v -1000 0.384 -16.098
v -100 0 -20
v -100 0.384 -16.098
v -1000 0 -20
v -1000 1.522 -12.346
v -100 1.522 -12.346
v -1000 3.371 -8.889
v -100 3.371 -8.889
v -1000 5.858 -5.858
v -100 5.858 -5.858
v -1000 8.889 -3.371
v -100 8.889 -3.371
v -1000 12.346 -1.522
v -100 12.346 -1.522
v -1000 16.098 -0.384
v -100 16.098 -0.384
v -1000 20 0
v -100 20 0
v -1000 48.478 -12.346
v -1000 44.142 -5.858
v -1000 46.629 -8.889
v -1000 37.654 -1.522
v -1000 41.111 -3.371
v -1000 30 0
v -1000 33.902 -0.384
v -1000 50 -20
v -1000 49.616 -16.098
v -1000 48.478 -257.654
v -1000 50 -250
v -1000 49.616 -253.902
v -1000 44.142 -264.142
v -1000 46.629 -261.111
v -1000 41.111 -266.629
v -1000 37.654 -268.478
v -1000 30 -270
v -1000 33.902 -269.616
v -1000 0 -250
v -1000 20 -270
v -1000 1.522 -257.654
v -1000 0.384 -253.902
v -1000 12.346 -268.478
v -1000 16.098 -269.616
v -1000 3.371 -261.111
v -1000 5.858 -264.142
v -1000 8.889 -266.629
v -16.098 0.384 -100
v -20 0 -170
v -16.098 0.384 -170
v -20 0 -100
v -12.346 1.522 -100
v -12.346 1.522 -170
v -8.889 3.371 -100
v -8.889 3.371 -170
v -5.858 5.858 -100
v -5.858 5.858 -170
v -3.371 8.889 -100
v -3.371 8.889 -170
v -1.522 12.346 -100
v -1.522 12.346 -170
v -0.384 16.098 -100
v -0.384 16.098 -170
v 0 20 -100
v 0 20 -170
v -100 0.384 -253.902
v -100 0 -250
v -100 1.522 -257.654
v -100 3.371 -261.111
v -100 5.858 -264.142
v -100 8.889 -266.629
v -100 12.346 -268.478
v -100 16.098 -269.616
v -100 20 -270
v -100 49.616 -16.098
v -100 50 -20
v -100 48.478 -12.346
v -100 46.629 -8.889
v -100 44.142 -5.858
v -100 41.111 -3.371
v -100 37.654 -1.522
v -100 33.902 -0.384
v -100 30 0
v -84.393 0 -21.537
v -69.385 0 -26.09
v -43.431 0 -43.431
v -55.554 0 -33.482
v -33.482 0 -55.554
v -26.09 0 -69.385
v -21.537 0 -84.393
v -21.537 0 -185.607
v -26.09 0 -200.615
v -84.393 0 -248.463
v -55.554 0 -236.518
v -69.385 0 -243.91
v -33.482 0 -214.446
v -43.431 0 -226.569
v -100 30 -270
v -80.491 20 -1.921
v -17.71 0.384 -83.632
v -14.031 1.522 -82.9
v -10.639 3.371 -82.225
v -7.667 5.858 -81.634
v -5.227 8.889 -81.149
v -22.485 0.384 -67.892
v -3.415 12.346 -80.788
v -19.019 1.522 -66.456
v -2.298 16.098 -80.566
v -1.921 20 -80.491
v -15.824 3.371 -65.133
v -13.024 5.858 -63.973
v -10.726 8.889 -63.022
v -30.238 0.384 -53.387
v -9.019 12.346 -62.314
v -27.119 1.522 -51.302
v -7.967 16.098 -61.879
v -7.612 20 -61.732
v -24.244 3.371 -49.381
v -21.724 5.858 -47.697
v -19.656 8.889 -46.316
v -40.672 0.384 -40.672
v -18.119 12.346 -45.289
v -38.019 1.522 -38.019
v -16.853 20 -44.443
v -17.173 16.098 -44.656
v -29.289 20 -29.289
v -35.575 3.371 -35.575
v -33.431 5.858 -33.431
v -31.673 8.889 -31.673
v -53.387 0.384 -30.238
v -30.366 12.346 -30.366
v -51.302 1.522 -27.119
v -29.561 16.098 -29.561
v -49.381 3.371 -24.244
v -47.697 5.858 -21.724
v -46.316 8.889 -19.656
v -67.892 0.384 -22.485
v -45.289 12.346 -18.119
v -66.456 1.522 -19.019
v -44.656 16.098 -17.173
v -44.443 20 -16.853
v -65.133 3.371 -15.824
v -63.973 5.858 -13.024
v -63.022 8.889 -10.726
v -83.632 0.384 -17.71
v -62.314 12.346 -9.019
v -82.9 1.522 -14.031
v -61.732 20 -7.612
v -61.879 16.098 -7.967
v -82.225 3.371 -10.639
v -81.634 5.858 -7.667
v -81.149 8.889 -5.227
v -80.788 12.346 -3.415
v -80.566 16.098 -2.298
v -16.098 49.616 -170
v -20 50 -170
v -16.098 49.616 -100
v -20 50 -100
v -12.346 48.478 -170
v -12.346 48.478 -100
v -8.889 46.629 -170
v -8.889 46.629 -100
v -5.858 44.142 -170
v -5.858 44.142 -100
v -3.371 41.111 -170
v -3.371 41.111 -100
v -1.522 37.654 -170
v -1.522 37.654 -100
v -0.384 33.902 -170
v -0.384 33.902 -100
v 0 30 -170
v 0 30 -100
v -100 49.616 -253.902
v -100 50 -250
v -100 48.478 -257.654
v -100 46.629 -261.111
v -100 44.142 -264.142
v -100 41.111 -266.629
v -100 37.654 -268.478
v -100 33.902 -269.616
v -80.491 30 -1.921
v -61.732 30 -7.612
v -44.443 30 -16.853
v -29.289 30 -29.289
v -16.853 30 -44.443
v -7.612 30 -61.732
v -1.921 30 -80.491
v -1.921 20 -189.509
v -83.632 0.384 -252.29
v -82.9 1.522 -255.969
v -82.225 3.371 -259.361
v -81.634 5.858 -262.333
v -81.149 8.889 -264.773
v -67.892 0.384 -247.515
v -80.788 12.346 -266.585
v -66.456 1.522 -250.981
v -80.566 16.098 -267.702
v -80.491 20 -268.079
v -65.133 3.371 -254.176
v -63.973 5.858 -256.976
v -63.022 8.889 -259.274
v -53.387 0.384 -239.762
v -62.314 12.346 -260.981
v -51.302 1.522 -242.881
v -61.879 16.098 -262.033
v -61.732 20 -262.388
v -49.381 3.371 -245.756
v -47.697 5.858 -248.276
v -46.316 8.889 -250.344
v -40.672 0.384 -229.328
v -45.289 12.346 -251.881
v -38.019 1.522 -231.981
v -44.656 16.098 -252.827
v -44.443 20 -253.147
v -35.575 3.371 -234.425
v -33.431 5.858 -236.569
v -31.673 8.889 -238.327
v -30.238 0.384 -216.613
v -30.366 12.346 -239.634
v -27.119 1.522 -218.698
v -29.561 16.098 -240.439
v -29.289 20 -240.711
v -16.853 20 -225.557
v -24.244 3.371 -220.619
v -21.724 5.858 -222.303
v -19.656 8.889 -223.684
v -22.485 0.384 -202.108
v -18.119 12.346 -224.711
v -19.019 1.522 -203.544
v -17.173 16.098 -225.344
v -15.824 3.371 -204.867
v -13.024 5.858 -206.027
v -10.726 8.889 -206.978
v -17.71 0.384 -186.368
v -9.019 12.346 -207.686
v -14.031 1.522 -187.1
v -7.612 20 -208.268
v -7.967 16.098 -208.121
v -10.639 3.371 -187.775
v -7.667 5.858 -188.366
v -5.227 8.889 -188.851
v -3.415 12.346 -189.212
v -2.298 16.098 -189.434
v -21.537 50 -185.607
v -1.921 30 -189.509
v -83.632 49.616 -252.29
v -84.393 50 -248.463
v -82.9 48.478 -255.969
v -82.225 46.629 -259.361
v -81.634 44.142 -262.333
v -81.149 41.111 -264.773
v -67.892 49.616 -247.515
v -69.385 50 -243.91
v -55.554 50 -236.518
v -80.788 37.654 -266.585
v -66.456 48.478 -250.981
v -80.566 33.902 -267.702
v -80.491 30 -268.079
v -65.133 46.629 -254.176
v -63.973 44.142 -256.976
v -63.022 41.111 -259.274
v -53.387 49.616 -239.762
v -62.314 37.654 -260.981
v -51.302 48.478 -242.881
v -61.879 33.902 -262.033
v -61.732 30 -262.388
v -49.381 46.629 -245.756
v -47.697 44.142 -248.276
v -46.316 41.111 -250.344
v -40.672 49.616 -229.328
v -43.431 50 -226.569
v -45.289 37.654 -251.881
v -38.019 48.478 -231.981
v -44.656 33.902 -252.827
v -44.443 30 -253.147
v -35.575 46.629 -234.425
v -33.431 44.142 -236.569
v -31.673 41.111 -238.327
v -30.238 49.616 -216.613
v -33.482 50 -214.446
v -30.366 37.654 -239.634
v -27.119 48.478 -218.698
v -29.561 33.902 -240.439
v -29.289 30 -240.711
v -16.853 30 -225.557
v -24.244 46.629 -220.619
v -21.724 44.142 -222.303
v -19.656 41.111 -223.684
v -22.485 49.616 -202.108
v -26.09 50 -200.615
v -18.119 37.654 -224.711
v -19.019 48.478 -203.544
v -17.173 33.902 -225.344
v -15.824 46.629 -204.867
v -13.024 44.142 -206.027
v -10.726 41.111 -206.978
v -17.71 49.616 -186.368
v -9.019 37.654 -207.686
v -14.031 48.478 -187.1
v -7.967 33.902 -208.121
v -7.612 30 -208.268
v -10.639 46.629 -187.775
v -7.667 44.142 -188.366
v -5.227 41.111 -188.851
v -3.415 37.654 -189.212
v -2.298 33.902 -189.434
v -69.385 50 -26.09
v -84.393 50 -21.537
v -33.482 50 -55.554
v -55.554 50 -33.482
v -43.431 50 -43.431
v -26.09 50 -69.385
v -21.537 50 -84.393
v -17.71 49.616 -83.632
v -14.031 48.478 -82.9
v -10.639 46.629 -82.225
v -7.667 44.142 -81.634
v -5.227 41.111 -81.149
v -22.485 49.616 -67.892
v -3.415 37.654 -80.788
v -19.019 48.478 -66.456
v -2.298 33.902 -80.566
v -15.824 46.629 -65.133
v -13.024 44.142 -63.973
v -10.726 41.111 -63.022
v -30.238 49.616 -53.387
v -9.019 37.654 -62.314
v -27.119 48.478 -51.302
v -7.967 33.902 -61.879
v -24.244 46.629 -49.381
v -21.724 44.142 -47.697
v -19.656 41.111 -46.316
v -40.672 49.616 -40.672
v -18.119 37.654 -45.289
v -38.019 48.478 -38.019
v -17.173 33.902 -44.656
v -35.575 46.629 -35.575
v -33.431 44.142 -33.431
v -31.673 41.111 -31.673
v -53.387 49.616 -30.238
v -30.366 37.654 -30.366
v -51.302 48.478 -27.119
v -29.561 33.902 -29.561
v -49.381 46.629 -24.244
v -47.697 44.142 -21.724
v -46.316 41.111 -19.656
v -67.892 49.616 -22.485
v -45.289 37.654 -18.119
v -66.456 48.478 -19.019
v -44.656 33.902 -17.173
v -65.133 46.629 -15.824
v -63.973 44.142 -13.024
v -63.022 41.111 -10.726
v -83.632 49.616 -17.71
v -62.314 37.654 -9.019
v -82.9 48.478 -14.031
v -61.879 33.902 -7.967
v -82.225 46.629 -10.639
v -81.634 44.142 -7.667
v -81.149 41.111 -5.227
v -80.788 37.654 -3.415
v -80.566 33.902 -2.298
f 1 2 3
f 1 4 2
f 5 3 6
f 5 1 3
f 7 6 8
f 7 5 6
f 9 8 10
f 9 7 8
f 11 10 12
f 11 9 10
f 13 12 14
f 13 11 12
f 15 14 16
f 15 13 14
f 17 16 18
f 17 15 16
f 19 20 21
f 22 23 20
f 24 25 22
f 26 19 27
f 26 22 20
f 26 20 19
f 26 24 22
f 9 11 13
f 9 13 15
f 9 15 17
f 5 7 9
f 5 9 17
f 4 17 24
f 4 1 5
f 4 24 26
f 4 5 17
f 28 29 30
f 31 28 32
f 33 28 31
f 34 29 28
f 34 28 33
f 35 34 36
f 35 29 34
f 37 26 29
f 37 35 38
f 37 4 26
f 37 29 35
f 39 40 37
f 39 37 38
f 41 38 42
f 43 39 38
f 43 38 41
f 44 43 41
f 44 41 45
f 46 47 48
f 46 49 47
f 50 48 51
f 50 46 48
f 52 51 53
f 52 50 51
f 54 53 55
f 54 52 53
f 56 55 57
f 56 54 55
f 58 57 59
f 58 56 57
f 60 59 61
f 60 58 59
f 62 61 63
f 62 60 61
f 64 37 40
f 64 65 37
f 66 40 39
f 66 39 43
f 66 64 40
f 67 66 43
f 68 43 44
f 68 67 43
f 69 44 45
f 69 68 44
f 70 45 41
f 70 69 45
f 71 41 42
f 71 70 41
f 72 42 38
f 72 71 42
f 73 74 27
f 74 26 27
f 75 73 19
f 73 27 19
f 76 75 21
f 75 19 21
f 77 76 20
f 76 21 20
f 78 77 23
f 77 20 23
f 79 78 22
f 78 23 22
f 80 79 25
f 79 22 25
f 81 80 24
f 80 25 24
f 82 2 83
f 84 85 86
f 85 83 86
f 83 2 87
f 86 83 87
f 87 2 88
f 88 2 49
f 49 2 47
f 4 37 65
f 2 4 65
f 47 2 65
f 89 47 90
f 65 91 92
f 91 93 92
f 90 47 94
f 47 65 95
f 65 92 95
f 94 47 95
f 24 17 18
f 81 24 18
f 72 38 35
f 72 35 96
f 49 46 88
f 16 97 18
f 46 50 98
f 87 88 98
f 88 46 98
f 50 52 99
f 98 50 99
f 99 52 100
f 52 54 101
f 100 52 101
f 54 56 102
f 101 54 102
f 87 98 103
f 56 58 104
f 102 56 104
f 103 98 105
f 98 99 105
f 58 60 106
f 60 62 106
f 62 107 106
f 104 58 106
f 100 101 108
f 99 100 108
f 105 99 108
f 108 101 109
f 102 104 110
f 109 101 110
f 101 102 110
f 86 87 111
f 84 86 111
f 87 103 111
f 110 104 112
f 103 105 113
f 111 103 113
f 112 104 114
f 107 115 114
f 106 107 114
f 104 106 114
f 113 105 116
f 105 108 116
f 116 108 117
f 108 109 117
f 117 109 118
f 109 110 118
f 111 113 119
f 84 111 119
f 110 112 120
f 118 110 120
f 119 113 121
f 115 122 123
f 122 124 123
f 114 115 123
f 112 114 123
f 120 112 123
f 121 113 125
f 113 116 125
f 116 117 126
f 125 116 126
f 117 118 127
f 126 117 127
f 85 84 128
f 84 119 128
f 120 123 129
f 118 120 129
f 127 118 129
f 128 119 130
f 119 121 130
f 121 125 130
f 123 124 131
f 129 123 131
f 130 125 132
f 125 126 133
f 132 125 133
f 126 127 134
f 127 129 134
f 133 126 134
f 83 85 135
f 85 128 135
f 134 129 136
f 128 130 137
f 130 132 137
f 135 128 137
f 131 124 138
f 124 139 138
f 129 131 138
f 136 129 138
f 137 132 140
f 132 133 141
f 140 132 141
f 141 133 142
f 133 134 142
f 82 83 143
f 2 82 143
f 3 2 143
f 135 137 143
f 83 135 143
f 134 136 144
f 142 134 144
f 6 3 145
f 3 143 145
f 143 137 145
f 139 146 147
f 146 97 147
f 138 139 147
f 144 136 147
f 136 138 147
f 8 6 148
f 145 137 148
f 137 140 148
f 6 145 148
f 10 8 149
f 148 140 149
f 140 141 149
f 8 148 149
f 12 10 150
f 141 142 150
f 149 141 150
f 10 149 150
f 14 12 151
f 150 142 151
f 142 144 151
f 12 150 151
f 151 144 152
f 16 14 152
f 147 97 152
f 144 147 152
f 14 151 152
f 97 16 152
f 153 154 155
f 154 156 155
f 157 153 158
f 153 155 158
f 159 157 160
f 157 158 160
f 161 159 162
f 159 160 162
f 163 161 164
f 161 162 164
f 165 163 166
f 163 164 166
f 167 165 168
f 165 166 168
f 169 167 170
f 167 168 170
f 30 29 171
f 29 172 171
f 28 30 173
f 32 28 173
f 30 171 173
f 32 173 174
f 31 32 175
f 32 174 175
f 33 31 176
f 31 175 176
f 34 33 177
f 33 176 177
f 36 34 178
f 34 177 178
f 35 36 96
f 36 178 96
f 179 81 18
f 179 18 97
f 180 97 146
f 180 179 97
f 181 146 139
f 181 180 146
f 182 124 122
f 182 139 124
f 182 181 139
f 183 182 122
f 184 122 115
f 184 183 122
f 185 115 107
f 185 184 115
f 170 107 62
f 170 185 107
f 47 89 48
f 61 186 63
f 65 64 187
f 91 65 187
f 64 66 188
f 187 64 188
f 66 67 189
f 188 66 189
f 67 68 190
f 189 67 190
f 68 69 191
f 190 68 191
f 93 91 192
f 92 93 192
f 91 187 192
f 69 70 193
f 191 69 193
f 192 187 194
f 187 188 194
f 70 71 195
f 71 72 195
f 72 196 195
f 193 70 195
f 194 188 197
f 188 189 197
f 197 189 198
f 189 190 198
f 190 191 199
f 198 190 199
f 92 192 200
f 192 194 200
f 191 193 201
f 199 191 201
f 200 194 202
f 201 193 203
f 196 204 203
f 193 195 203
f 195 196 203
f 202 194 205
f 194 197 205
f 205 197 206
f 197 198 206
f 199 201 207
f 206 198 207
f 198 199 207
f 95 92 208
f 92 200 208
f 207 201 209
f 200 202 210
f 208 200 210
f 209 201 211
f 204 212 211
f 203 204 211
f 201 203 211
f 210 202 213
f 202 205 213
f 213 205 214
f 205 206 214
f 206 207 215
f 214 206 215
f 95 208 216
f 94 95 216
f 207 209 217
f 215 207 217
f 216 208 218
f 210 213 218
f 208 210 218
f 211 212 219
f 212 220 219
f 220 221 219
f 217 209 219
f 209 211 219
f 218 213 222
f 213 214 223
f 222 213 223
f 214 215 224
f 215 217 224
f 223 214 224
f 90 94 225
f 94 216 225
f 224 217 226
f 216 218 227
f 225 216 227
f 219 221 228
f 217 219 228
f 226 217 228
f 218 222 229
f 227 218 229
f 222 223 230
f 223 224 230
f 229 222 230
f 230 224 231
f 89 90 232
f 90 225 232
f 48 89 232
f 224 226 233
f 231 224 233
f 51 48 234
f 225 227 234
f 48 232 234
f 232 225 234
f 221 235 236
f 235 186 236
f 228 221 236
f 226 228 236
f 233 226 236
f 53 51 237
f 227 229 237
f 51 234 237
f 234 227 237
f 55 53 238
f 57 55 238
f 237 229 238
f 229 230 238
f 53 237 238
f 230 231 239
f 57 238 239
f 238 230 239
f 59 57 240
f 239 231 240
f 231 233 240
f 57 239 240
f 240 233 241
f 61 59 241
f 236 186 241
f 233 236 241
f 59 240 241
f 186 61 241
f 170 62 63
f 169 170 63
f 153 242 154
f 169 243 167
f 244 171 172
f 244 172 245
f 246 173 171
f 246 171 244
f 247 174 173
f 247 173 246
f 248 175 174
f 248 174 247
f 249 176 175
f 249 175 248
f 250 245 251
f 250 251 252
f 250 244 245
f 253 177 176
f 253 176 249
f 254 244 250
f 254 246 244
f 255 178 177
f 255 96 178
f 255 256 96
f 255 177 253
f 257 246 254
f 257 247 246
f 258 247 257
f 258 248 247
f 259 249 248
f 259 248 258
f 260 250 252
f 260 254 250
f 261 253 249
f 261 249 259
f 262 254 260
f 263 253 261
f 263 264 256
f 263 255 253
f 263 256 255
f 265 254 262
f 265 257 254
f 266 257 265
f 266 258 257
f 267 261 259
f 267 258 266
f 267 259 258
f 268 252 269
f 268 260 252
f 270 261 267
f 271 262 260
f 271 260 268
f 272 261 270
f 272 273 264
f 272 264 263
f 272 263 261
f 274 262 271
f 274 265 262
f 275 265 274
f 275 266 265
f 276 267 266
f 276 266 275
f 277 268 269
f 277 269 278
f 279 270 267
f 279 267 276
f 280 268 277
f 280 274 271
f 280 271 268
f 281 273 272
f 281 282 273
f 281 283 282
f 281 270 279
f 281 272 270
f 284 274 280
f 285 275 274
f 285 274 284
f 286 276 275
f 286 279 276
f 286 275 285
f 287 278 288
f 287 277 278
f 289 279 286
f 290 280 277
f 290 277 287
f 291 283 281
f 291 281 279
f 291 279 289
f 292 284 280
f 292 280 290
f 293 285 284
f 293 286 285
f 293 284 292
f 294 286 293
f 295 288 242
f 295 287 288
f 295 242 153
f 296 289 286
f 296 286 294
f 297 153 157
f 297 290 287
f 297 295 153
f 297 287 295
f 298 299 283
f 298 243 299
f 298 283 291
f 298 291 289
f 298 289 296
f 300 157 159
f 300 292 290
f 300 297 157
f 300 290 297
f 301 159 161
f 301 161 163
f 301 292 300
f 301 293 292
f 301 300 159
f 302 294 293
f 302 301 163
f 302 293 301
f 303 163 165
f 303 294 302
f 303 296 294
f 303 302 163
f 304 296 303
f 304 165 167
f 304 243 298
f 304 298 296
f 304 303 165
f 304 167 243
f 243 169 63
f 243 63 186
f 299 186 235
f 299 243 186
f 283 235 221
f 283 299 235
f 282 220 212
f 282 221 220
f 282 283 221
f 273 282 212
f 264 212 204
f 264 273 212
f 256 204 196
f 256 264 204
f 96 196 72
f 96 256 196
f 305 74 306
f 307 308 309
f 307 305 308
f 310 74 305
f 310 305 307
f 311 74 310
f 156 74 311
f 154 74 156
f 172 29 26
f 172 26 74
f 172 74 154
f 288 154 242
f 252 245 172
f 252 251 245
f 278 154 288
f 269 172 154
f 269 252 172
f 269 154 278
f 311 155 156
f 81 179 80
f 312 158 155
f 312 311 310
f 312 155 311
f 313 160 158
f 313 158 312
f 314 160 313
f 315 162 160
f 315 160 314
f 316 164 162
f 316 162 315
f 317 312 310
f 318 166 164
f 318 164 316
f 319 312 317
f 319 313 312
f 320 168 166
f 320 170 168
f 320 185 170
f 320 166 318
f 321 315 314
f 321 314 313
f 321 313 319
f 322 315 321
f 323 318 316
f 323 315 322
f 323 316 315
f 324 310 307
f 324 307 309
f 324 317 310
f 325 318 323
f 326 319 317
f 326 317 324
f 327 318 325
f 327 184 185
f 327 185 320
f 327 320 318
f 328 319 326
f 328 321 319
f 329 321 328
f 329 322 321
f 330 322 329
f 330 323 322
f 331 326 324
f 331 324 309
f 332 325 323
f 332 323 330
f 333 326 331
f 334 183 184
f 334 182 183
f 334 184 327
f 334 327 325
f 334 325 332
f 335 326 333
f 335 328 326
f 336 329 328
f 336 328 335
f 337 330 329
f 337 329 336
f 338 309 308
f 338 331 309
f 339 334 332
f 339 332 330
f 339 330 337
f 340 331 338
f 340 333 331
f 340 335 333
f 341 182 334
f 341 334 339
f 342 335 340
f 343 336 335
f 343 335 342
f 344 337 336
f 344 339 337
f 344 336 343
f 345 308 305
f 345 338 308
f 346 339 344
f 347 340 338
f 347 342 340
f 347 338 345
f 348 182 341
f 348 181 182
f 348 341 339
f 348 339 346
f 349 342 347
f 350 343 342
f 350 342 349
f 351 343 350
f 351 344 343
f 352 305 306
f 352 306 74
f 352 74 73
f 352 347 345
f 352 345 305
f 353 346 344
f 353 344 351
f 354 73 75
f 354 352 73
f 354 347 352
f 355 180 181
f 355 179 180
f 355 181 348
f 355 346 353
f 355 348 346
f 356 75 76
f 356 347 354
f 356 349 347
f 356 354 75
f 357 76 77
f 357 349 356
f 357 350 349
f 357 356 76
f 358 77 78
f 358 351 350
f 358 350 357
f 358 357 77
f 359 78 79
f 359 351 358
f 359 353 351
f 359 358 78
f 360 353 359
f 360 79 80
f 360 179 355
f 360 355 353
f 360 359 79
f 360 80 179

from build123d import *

# Parameters (mm, degrees)
SKETCH1_W           = 1000
SKETCH1_H           = 270
BOSS_EXTRUDE1_DEPTH = 50
FILLET1_R           = 100
FILLET2_R           = 20


with BuildPart() as part:
    # Sketch1 → Boss-Extrude1 (new body)
    with BuildSketch(Plane(origin=(0, 0, 0), x_dir=(1, 0, 0), z_dir=(0, 1, 0))):
        with Locations((-500, 135)):
            Rectangle(SKETCH1_W, SKETCH1_H)
    extrude(amount=BOSS_EXTRUDE1_DEPTH)

    # Fillet1
    fillet1_edges = [part.edges().sort_by_distance(p)[0] for p in [
        (0, 25, 0),
        (0, 25, -270),
    ]]
    fillet(fillet1_edges, radius=FILLET1_R)

    # Fillet2
    fillet2_edges = [part.edges().sort_by_distance(p)[0] for p in [
        (-550, 0, -270),
        (-550, 50, -270),
        (0, 0, -135),
        (-550, 0, 0),
        (-29.289321881, 0, -29.289321881),
        (-29.289321881, 0, -240.710678119),
        (0, 50, -135),
        (-550, 50, 0),
        (-29.289321881, 50, -29.289321881),
        (-29.289321881, 50, -240.710678119),
    ]]
    fillet(fillet2_edges, radius=FILLET2_R)


solid = part.part
